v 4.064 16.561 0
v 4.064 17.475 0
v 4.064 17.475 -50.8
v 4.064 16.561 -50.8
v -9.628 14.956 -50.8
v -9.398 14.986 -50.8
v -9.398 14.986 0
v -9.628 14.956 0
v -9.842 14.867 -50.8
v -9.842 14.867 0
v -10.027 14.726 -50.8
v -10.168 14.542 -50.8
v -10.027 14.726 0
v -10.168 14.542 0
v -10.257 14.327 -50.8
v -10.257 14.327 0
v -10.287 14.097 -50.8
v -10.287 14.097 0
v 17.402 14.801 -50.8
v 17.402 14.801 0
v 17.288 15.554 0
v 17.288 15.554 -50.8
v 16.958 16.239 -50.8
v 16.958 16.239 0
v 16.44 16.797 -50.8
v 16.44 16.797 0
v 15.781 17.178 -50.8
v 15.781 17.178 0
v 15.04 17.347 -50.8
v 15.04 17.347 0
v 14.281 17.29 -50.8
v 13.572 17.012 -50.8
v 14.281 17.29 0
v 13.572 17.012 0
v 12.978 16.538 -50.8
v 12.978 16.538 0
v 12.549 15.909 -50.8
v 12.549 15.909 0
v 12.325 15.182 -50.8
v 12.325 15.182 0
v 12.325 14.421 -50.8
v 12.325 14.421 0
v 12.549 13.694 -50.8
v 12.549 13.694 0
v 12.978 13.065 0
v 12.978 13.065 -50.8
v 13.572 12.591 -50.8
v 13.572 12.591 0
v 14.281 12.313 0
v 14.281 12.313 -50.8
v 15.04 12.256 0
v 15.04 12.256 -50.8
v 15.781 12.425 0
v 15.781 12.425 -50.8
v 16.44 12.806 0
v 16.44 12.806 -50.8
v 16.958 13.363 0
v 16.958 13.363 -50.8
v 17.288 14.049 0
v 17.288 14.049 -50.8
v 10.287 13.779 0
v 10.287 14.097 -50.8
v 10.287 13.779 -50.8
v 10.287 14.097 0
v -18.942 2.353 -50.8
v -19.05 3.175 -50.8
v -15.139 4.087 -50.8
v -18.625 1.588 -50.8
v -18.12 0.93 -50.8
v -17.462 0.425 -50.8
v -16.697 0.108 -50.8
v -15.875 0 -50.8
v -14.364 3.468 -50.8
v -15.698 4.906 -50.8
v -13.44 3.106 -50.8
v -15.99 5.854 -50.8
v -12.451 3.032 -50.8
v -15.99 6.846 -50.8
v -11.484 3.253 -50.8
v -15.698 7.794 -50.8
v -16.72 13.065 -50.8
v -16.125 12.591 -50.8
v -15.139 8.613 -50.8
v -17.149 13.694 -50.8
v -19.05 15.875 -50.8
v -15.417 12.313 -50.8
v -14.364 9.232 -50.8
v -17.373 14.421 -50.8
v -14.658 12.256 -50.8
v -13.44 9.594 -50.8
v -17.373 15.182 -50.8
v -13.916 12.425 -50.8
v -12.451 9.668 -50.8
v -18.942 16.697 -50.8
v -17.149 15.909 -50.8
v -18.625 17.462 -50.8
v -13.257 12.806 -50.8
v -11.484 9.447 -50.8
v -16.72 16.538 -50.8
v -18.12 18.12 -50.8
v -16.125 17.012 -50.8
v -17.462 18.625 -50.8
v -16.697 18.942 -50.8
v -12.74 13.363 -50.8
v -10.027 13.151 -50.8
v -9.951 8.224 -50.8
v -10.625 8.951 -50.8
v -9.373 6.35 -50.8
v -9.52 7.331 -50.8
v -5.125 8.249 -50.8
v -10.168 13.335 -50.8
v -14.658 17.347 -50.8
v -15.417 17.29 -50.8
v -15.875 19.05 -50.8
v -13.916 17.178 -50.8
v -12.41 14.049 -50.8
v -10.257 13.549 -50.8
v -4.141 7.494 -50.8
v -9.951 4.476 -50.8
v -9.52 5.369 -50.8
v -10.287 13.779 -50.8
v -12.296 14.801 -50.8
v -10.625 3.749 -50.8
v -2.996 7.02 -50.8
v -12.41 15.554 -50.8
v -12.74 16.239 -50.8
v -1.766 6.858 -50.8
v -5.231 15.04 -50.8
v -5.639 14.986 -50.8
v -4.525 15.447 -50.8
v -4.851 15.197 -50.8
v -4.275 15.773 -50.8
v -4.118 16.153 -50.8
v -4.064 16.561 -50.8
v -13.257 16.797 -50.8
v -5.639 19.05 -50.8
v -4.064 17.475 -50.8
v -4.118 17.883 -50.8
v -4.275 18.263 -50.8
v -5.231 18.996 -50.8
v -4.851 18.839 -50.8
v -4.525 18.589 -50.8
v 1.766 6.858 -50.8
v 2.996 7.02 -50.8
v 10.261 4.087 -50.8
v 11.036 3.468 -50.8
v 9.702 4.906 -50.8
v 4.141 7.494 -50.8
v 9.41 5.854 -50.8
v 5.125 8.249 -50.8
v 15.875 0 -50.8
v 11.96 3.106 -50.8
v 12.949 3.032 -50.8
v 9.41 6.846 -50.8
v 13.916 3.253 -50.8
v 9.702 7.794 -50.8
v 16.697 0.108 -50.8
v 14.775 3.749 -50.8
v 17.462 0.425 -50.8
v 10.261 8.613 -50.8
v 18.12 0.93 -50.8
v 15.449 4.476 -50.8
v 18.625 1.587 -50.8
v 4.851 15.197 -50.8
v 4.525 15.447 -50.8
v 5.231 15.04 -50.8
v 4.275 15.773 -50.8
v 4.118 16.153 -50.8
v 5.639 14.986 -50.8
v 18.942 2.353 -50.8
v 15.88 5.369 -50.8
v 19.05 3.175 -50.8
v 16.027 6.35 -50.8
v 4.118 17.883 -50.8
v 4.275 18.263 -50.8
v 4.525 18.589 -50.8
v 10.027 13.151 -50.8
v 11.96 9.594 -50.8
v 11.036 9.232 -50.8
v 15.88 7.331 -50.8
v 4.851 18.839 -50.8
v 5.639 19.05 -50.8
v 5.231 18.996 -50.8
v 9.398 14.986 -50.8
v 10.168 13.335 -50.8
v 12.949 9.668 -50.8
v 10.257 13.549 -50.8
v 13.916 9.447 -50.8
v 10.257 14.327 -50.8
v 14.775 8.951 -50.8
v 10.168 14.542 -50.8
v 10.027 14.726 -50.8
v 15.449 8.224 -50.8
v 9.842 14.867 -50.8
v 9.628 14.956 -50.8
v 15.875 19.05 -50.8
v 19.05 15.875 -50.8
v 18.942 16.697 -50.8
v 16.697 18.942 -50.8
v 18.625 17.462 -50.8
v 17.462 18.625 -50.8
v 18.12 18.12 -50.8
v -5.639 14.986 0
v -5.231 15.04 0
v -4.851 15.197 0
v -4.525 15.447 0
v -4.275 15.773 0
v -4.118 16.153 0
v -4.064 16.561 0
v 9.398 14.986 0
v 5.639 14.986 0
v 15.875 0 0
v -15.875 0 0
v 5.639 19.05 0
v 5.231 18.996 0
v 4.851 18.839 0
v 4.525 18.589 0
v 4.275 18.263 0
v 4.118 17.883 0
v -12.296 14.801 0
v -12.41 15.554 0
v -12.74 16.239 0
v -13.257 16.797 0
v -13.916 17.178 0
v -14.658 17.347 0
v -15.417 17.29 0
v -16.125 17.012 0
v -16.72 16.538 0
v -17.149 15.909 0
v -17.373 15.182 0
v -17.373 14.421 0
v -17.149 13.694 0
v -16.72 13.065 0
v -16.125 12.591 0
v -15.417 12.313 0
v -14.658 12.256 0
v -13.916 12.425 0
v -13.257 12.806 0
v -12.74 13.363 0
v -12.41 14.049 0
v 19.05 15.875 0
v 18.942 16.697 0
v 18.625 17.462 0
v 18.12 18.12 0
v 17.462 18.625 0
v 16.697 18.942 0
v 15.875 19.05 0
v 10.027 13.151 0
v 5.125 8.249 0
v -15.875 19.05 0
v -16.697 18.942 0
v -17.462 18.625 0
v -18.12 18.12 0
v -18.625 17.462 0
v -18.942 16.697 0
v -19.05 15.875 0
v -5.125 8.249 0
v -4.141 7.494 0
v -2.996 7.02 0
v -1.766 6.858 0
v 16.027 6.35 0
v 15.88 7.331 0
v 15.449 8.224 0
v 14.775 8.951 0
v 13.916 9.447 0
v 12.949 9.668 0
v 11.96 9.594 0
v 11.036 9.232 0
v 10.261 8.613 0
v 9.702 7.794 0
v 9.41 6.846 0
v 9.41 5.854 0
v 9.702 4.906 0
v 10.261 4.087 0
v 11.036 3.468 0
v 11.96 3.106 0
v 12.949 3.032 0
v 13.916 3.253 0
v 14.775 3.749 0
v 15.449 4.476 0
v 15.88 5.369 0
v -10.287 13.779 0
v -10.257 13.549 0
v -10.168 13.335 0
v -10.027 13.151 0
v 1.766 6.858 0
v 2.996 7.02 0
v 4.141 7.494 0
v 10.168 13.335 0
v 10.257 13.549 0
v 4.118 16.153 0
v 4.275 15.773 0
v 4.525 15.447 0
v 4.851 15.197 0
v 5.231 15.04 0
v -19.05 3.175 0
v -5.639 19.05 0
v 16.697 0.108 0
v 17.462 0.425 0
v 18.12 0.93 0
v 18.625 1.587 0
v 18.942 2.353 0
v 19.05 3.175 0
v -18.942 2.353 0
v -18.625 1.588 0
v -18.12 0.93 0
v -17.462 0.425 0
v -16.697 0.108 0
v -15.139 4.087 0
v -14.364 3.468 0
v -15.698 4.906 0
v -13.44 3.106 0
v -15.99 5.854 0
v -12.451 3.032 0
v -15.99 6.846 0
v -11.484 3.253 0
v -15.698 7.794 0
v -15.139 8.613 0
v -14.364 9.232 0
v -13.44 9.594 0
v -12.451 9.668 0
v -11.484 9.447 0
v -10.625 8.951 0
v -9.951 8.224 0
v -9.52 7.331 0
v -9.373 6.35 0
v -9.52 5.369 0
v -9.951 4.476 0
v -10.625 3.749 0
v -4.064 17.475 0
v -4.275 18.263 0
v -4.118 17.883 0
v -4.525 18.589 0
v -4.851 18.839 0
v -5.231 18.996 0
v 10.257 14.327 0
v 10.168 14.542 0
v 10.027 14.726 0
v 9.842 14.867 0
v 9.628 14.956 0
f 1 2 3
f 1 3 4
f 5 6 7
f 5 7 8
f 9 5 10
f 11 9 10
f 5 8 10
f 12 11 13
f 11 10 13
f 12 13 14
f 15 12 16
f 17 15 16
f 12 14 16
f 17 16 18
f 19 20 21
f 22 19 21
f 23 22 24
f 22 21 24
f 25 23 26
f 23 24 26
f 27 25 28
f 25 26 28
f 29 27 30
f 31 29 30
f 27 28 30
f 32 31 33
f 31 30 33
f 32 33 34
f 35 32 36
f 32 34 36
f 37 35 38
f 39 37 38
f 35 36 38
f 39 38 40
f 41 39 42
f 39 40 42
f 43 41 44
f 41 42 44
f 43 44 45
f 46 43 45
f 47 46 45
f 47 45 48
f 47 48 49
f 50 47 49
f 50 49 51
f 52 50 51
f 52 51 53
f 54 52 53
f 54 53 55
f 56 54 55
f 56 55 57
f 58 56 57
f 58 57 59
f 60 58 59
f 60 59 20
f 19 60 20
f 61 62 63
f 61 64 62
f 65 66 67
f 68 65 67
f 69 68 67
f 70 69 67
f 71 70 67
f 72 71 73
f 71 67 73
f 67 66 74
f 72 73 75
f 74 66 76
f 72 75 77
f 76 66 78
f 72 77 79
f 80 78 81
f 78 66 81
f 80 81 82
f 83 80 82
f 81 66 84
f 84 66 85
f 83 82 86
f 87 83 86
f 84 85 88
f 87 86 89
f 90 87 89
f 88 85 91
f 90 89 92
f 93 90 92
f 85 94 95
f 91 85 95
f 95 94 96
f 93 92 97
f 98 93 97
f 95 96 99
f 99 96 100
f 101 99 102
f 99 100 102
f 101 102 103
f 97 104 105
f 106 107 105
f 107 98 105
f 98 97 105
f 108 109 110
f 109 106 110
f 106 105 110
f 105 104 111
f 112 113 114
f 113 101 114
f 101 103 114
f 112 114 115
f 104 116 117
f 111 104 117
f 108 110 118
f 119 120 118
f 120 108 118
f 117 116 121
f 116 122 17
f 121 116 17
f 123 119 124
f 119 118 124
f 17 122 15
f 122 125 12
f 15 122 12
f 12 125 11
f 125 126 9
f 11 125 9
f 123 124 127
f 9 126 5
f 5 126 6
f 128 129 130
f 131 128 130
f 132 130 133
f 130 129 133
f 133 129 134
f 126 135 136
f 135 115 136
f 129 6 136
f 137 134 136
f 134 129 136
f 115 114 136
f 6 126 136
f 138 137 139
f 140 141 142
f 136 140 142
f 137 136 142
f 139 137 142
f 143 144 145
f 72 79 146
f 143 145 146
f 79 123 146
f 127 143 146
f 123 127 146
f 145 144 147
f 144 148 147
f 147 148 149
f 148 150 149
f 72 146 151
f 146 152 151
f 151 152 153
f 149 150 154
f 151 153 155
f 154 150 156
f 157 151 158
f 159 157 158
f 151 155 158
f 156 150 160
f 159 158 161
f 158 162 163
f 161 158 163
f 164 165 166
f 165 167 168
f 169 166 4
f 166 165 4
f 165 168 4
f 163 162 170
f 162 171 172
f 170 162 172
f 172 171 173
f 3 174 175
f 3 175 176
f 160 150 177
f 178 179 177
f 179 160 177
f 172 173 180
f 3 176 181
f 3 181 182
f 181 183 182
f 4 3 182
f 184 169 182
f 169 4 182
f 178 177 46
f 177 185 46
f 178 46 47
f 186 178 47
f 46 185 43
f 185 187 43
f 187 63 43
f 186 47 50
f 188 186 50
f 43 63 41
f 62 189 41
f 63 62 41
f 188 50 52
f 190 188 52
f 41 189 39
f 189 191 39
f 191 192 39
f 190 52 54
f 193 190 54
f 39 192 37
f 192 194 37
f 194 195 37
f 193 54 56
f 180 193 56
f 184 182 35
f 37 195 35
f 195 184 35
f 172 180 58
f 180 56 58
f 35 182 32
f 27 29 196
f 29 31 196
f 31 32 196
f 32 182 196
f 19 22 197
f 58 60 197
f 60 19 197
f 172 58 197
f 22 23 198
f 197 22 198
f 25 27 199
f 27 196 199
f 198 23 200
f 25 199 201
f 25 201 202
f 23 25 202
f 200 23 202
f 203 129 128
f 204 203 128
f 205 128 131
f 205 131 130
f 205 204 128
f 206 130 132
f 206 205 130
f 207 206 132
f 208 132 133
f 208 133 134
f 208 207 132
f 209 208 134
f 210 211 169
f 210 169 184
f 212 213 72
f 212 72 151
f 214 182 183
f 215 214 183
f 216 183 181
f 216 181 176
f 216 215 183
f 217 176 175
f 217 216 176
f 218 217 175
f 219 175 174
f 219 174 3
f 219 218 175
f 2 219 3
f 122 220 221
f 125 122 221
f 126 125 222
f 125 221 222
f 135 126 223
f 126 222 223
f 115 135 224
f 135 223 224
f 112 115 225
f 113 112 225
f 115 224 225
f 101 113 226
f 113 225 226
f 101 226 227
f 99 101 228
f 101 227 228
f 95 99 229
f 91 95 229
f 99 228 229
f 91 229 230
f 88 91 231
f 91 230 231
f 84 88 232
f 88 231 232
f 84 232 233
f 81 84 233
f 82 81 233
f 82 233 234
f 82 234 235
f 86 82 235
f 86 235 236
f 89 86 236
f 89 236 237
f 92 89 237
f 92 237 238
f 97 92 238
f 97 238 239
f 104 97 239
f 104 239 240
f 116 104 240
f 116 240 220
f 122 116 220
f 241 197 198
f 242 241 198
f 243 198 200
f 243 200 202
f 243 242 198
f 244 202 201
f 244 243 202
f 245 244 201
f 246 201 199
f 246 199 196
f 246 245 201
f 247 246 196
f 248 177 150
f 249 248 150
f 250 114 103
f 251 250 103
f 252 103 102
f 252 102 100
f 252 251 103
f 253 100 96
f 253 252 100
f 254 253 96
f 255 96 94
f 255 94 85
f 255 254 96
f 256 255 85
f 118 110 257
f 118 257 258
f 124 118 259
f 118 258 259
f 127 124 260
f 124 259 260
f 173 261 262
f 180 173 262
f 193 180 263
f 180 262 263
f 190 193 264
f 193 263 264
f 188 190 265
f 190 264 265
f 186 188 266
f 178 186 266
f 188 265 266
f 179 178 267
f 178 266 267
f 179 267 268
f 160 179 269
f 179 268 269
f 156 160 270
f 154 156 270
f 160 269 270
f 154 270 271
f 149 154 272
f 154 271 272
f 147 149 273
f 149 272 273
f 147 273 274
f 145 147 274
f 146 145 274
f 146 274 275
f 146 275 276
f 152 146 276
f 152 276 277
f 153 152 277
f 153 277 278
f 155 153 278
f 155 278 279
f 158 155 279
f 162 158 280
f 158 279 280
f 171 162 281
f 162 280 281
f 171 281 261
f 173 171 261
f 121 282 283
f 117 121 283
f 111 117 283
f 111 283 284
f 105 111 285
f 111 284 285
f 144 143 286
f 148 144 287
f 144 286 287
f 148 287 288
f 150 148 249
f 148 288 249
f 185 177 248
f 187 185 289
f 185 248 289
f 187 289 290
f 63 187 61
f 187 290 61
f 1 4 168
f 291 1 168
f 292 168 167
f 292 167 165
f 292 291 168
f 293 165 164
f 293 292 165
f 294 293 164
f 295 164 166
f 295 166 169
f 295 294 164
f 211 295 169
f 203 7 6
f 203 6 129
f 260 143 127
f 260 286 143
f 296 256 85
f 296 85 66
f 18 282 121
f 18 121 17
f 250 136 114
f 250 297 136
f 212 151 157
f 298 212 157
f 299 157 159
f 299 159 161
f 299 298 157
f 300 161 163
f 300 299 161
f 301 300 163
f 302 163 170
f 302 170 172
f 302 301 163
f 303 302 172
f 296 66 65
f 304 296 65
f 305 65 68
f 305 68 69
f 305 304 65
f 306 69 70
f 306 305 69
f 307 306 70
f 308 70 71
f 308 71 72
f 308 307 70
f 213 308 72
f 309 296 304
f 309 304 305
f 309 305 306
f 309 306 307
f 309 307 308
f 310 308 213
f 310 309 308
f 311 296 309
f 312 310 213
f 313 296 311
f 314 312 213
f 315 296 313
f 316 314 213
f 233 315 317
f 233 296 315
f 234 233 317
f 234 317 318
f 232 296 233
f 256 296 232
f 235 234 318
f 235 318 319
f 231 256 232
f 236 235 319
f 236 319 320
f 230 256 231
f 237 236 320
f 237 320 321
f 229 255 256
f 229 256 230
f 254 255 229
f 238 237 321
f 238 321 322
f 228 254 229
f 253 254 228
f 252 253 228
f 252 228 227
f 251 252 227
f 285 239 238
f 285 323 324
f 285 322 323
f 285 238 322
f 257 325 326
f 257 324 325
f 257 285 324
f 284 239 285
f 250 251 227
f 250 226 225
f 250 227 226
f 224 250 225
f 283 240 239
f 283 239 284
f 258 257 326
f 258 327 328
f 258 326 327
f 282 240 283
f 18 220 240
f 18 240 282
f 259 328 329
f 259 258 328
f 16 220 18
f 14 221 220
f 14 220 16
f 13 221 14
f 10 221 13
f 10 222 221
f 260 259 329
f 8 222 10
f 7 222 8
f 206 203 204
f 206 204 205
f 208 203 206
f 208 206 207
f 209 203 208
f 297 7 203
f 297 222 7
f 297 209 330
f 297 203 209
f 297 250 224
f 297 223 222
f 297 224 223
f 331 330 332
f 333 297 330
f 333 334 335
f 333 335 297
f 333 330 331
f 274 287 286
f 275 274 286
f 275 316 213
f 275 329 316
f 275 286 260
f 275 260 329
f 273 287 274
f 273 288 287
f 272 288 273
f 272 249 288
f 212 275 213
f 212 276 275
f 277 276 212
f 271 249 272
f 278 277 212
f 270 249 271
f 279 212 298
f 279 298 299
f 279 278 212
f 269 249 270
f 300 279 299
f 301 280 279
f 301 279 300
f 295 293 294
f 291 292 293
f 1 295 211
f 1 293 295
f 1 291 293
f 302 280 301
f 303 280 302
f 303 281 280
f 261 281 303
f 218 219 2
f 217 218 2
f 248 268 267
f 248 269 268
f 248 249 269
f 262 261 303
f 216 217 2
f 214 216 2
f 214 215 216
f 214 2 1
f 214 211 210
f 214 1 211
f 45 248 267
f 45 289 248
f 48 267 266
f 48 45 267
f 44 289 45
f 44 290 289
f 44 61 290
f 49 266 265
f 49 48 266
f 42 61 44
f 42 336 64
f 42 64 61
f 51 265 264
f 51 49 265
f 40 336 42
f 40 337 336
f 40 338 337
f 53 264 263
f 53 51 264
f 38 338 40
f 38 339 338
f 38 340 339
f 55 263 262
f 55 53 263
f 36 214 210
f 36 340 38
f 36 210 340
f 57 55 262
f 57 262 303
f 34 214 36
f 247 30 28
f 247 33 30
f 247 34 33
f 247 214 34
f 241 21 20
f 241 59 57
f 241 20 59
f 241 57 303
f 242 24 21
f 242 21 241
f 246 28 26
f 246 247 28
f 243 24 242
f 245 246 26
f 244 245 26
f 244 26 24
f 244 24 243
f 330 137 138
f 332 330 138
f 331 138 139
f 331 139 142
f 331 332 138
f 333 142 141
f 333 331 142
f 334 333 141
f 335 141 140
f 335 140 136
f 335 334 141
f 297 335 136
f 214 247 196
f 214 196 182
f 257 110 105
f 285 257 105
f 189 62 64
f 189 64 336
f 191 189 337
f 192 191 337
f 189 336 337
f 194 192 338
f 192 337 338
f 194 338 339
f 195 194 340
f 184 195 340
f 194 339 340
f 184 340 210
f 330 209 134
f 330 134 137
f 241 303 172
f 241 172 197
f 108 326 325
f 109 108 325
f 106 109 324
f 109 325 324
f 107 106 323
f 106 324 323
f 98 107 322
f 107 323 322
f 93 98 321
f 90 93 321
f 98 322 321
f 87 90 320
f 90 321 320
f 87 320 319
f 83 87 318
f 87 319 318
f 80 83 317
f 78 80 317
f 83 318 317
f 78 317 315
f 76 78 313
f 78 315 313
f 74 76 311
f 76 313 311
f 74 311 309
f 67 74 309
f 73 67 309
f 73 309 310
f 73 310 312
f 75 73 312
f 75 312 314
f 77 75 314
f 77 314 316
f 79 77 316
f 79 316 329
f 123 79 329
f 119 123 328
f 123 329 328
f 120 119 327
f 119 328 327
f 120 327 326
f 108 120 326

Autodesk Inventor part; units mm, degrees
ref_plane "YZ Plane" through (0, 0, 0) normal (1, 0, 0) x (0, 1, 0)
ref_plane "XZ Plane" through (0, 0, 0) normal (0, 1, 0) x (-1, 0, 0)
ref_plane "XY Plane" through (0, 0, 0) normal (0, 0, 1) x (1, 0, 0)
sketch "Sketch_1" plane through (0, 0, 0) normal (0, 0, 1) x (1, 0, 0)
  arc A0 (-19.05, 3.175) -> (-15.875, 0) centre (-15.875, 3.175) ccw
  line L0 (-15.875, 0) -> (15.875, 0)
  arc A1 (15.875, 0) -> (19.05, 3.175) centre (15.875, 3.175) ccw
  line L1 (19.05, 3.175) -> (19.05, 15.875)
  arc A2 (19.05, 15.875) -> (15.875, 19.05) centre (15.875, 15.875) ccw
  line L2 (15.875, 19.05) -> (5.6388, 19.05)
  arc A3 (5.6388, 19.05) -> (4.064, 17.4752) centre (5.6388, 17.4752) ccw
  line L3 (4.064, 17.4752) -> (4.064, 16.5608)
  arc A4 (4.064, 16.5608) -> (5.6388, 14.986) centre (5.6388, 16.5608) ccw
  line L4 (5.6388, 14.986) -> (9.398, 14.986)
  arc A5 (10.287, 14.097) -> (9.398, 14.986) centre (9.398, 14.097) ccw
  line L5 (10.287, 14.097) -> (10.287, 13.7794)
  arc A6 (10.0266, 13.1508) -> (10.287, 13.7794) centre (9.398, 13.7794) ccw
  line L6 (10.0266, 13.1508) -> (5.125, 8.2492)
  arc A7 (1.7664, 6.858) -> (5.125, 8.2492) centre (1.7664, 11.6078) ccw
  line L7 (1.7664, 6.858) -> (-1.7664, 6.858)
  arc A8 (-5.125, 8.2492) -> (-1.7664, 6.858) centre (-1.7664, 11.6078) ccw
  line L8 (-5.125, 8.2492) -> (-10.0266, 13.1508)
  arc A9 (-10.287, 13.7794) -> (-10.0266, 13.1508) centre (-9.398, 13.7794) ccw
  line L9 (-10.287, 13.7794) -> (-10.287, 14.097)
  arc A10 (-9.398, 14.986) -> (-10.287, 14.097) centre (-9.398, 14.097) ccw
  line L10 (-9.398, 14.986) -> (-5.6388, 14.986)
  arc A11 (-5.6388, 14.986) -> (-4.064, 16.5608) centre (-5.6388, 16.5608) ccw
  line L11 (-4.064, 16.5608) -> (-4.064, 17.4752)
  arc A12 (-4.064, 17.4752) -> (-5.6388, 19.05) centre (-5.6388, 17.4752) ccw
  line L12 (-5.6388, 19.05) -> (-15.875, 19.05)
  arc A13 (-15.875, 19.05) -> (-19.05, 15.875) centre (-15.875, 15.875) ccw
  line L13 (-19.05, 15.875) -> (-19.05, 3.175)
  circle A14 centre (14.8488, 14.8014) radius 2.5527
  circle A15 centre (12.7, 6.35) radius 3.3274
  circle A16 centre (-12.7, 6.35) radius 3.3274
  circle A17 centre (-14.8488, 14.8014) radius 2.5527
extrude "Extrusion1" add sketch "Sketch_1" against normal blind 50.8
properties part number "1575-2-CL"
